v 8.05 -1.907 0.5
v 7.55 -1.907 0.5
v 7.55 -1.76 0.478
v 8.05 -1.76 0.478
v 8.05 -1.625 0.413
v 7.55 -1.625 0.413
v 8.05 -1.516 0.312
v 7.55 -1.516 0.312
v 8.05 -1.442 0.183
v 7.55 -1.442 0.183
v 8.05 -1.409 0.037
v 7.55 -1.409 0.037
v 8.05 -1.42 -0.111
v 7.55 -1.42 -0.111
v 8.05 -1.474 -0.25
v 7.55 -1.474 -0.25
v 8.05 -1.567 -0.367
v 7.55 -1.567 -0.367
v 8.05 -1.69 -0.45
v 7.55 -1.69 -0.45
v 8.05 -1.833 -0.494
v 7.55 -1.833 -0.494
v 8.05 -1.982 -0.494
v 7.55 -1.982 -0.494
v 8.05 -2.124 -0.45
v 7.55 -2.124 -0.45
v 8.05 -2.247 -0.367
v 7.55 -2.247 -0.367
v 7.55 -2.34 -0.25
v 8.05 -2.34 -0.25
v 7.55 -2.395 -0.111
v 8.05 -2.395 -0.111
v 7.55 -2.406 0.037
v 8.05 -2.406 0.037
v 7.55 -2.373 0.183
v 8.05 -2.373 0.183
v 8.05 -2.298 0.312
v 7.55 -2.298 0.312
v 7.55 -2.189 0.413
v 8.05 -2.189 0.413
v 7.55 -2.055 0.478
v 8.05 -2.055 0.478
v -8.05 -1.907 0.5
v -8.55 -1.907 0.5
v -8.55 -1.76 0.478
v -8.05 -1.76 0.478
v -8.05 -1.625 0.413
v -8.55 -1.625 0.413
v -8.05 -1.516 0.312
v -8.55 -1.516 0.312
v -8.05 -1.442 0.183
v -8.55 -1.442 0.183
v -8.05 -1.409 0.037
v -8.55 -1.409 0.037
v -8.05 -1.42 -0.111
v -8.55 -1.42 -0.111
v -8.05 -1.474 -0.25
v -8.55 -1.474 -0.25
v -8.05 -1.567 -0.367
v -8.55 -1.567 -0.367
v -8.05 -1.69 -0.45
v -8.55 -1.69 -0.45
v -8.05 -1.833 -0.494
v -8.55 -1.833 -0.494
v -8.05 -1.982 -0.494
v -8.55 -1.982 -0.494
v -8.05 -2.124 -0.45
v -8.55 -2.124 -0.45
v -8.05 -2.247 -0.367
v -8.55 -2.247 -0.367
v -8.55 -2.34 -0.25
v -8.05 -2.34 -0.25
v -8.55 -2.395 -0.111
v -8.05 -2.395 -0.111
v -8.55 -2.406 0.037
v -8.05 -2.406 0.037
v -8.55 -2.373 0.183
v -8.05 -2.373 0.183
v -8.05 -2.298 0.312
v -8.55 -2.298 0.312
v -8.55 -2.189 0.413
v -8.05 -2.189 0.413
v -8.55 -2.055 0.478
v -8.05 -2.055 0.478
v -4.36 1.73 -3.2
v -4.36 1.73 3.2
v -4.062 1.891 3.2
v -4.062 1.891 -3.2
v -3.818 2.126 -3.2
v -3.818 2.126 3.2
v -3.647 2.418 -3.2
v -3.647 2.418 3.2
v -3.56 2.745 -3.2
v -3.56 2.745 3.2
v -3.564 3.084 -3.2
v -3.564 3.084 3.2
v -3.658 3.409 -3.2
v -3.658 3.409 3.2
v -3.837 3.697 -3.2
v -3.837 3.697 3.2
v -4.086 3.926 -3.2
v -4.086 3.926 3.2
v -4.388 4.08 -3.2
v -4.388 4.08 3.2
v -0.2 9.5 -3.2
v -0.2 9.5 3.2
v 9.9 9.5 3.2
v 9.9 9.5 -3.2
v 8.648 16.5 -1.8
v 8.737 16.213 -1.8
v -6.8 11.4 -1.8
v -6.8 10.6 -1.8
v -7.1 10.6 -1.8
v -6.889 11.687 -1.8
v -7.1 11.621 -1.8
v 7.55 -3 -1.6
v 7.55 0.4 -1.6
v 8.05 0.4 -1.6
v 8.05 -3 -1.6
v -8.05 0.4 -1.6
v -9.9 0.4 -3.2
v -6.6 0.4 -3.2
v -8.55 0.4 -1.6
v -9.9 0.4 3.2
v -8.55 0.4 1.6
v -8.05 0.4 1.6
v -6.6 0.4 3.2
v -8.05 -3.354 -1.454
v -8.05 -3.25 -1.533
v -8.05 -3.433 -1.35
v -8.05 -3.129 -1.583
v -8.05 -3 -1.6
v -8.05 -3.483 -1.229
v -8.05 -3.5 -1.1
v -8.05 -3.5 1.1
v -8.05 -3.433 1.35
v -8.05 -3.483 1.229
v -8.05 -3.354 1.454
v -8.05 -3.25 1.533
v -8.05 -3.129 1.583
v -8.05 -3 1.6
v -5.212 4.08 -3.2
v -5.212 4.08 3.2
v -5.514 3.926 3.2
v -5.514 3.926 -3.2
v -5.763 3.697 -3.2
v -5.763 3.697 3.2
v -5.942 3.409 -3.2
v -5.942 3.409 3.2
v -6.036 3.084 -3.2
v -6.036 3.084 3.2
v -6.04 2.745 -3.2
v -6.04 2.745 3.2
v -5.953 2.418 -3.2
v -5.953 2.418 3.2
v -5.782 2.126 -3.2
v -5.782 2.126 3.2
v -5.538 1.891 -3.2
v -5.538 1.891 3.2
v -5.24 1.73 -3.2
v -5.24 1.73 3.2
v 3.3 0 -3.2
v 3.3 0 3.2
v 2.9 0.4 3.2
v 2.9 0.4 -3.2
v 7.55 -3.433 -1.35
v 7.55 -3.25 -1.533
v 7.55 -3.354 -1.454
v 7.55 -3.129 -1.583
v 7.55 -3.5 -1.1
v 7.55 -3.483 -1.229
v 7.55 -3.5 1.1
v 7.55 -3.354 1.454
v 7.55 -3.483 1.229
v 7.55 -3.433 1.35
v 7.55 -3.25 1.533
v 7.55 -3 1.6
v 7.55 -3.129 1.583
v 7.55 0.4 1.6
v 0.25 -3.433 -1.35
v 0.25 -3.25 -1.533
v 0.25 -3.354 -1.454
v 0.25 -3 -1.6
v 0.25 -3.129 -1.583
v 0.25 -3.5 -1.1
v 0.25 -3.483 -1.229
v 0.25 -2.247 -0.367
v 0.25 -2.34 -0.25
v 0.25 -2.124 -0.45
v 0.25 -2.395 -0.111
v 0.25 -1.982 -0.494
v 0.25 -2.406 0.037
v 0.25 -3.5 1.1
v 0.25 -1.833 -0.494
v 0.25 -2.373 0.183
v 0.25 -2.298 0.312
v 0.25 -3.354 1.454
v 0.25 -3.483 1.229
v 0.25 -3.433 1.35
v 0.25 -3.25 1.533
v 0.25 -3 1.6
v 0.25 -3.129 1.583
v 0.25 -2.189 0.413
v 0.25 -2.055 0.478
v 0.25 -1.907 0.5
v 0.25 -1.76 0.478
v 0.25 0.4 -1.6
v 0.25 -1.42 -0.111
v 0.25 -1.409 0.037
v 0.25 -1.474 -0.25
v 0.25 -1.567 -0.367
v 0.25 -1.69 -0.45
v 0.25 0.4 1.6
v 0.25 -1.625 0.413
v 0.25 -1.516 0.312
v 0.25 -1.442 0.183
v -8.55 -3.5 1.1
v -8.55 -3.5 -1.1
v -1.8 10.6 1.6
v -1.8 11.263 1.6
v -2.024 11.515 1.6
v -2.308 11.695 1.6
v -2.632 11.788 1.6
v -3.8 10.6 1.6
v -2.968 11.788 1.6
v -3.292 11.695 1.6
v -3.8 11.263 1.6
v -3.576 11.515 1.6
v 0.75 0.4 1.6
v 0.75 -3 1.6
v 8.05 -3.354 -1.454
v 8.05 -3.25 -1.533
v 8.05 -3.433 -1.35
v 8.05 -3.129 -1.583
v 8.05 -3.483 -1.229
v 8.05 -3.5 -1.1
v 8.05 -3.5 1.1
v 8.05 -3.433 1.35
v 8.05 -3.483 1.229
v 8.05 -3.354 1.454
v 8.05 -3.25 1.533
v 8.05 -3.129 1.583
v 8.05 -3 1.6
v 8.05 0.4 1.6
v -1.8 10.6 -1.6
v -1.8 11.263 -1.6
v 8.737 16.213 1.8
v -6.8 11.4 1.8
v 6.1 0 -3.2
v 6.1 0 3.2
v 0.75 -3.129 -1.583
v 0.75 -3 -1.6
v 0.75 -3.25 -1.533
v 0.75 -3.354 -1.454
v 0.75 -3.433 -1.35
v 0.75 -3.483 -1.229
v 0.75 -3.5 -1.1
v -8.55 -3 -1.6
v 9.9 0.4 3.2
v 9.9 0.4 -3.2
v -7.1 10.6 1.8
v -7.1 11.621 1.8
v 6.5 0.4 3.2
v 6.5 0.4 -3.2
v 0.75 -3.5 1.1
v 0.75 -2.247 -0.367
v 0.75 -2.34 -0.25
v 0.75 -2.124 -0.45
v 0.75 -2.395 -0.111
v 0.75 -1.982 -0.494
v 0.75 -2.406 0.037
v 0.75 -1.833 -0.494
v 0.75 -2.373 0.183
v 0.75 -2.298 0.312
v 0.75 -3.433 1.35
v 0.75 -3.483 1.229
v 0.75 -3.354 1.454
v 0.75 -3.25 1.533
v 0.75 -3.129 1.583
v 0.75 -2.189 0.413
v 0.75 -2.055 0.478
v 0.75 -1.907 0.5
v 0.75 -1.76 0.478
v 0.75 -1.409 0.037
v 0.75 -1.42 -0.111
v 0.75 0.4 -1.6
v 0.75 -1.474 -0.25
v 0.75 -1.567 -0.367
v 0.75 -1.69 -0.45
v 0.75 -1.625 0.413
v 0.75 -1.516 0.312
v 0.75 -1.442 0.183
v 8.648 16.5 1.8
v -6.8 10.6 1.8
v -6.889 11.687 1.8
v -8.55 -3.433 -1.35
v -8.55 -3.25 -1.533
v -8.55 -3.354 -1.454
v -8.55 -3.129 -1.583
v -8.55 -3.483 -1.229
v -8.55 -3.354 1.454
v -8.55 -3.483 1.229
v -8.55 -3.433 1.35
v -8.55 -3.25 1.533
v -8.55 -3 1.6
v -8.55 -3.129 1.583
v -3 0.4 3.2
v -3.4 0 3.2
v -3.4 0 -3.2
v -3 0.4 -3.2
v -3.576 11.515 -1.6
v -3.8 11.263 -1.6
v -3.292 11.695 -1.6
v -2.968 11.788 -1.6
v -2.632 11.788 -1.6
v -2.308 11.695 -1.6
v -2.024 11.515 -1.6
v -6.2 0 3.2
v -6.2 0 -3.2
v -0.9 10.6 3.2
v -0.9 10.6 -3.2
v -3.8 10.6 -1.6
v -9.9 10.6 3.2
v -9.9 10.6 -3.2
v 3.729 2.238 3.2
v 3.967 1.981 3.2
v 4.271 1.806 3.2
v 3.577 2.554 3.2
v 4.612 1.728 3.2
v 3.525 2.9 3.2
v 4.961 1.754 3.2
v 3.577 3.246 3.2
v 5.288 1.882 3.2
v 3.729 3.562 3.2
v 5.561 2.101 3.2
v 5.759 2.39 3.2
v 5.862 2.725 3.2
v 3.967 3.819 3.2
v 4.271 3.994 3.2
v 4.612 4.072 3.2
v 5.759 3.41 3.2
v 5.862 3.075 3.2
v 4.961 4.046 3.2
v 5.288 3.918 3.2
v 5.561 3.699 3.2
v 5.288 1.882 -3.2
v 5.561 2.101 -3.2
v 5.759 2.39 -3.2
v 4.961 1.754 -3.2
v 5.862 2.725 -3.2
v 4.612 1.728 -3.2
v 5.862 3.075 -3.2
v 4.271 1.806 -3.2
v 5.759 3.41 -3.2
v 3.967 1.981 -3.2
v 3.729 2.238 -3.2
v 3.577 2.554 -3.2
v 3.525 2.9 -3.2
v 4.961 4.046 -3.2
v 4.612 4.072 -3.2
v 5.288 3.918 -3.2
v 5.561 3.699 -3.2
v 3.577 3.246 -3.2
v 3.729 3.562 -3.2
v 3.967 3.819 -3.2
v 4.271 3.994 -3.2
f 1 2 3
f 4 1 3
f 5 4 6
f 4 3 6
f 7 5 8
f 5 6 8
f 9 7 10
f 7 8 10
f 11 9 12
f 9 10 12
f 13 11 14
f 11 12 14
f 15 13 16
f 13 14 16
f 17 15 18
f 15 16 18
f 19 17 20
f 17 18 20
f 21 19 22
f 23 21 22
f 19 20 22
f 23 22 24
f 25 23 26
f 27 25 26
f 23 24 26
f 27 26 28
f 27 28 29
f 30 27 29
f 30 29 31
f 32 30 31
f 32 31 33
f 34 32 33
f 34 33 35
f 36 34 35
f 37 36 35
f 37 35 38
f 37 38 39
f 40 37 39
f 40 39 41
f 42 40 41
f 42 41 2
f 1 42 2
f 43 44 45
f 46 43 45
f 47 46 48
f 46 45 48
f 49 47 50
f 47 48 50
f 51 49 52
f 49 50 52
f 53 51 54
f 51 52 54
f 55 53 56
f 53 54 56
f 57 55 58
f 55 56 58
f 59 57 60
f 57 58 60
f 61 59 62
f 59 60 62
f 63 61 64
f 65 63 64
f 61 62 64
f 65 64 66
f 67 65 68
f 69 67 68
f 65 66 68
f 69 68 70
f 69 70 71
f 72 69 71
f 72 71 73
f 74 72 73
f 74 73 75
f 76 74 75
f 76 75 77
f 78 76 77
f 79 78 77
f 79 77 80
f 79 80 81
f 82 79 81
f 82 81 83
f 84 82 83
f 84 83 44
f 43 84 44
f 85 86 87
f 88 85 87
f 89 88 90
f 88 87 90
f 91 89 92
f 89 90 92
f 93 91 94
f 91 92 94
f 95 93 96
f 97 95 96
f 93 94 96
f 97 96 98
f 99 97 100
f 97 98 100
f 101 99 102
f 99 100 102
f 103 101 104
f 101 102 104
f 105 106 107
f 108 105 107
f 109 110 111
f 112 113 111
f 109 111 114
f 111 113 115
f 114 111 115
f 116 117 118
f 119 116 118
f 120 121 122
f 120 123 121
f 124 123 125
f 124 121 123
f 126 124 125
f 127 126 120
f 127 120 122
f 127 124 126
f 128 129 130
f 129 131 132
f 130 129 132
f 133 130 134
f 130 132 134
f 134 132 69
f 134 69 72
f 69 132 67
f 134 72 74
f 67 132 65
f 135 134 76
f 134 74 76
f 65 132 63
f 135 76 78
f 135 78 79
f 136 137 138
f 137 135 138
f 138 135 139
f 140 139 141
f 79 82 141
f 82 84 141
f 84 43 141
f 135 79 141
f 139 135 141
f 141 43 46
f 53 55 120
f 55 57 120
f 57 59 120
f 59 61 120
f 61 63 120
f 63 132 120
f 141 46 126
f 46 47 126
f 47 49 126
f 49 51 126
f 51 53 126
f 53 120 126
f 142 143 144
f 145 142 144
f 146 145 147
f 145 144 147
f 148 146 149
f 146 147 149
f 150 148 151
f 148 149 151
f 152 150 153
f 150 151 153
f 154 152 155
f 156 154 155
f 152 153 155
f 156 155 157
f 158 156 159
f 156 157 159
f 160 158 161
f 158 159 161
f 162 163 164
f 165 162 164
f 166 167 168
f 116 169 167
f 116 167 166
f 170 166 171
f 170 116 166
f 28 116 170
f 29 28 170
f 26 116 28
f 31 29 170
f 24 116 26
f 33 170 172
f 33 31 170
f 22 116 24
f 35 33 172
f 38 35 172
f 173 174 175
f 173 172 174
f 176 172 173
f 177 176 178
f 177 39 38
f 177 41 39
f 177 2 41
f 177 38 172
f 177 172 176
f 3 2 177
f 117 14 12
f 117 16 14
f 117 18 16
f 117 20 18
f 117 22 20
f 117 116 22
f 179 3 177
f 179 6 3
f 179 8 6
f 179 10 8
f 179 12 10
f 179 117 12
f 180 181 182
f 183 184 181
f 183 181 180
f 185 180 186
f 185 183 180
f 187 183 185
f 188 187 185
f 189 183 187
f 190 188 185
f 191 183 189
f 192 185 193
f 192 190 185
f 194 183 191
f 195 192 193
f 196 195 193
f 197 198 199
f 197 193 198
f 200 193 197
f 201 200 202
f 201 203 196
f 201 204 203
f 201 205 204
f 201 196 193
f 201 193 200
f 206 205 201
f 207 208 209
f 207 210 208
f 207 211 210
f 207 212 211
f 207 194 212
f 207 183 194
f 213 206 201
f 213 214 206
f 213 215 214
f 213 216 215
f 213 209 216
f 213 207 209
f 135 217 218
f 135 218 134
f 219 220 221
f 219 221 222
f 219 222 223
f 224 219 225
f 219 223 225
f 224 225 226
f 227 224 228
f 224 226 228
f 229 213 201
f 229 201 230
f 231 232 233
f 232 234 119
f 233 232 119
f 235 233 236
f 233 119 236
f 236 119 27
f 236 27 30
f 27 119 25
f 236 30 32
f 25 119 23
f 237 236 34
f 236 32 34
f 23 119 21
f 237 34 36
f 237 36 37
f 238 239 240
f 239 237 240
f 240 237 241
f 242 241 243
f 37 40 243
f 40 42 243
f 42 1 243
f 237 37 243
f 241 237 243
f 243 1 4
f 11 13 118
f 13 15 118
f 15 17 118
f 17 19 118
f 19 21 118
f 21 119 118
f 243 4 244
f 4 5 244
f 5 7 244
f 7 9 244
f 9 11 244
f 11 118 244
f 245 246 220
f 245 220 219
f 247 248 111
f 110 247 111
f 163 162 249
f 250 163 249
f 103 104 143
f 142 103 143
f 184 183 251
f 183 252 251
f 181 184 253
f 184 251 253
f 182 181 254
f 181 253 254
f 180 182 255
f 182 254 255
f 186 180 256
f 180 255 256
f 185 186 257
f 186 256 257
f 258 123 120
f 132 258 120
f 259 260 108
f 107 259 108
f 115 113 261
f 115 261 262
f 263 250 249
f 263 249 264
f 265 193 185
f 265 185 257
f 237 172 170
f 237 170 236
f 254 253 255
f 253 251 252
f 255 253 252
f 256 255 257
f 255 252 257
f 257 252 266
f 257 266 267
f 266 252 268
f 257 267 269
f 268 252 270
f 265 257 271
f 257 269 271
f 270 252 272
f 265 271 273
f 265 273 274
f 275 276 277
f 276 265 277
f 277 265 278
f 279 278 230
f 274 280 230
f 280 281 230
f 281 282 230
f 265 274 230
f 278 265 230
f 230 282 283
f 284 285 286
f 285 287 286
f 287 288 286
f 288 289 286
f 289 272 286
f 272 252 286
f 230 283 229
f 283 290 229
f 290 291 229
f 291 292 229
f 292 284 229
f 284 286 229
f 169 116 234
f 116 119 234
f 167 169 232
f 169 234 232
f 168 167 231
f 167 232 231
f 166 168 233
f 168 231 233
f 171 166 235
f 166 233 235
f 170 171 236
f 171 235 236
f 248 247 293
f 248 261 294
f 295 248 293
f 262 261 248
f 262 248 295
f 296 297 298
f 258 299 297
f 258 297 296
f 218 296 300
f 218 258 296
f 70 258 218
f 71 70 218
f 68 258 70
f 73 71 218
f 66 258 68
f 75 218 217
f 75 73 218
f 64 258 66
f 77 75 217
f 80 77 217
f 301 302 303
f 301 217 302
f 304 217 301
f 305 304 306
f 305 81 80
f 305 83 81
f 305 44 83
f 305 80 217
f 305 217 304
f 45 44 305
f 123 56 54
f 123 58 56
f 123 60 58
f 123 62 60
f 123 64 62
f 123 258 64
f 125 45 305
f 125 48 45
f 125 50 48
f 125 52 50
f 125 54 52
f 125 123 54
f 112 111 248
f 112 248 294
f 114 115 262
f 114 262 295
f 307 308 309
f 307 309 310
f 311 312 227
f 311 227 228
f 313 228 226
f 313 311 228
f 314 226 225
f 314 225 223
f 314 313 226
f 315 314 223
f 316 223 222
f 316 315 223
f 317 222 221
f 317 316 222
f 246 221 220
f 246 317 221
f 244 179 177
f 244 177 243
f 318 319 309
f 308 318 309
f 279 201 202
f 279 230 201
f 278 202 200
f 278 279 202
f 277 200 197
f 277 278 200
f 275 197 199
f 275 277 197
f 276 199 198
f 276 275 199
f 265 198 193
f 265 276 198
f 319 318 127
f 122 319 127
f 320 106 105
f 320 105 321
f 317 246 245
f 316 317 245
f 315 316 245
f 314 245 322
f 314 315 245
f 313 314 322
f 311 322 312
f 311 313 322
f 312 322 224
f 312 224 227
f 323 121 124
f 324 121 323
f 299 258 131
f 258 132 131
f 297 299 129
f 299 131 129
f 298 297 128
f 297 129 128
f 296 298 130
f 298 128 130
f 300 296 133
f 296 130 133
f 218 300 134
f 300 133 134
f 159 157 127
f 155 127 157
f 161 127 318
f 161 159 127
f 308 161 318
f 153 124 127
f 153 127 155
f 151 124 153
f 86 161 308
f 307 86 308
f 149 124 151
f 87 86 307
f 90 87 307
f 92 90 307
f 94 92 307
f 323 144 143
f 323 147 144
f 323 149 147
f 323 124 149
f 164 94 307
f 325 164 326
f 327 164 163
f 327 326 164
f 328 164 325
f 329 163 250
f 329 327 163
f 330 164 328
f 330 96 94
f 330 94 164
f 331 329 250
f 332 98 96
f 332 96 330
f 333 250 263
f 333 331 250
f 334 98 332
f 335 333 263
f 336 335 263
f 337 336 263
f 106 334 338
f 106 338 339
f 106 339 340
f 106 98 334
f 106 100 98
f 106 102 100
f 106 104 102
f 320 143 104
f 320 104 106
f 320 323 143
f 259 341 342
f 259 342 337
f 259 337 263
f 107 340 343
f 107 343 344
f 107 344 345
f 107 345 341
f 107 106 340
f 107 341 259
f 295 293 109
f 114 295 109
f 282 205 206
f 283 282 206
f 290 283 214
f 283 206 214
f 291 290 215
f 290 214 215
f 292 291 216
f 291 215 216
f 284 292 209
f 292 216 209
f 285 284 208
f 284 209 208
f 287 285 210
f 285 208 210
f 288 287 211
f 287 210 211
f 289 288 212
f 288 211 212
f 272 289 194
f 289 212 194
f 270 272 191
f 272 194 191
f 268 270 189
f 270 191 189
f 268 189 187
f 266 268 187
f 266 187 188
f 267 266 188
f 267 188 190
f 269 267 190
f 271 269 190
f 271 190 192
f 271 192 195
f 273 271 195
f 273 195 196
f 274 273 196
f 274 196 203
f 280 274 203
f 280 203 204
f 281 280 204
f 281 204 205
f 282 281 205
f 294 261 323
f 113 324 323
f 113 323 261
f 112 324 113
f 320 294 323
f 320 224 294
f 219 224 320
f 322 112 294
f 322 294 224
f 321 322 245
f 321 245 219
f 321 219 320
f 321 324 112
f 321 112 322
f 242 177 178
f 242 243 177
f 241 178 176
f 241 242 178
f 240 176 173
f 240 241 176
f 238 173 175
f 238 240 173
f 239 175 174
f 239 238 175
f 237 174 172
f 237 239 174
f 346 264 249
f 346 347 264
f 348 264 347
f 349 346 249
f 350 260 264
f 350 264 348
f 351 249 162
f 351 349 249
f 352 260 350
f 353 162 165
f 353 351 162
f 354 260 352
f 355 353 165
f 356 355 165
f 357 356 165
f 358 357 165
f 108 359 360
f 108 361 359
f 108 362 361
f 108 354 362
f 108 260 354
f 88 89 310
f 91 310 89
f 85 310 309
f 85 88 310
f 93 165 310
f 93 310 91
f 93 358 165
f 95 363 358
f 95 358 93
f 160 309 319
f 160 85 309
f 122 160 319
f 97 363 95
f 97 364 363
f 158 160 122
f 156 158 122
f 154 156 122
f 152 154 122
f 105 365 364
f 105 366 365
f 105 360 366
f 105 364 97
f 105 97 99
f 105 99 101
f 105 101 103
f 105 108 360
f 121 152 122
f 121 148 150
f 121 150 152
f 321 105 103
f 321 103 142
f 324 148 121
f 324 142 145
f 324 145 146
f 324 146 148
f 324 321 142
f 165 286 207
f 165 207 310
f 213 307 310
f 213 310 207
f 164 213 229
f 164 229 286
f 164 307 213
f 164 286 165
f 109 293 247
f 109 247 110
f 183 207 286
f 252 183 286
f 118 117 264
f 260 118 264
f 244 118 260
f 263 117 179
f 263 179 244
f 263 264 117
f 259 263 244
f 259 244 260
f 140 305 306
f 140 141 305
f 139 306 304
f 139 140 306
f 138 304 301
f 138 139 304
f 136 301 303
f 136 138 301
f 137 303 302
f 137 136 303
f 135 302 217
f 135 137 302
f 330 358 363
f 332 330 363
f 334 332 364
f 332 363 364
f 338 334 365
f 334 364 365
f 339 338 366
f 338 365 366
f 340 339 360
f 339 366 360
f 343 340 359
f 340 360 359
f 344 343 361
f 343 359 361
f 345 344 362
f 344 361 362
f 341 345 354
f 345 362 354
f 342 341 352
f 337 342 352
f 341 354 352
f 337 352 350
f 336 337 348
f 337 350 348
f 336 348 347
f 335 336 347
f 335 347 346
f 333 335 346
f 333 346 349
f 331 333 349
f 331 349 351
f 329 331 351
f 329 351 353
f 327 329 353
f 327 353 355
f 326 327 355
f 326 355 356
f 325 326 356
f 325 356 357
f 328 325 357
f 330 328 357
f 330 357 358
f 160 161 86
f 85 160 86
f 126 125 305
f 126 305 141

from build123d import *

# Parameters (mm, degrees)
BOSS_EXTRU_1_DEPTH                    = 3.6
ESQUISSE2_W                           = 19.8
ESQUISSE2_H                           = 10.6
BOSS_EXTRU_2_DEPTH                    = 1.4
ESQUISSE3_W                           = 19.8
ESQUISSE3_H                           = 10.6
BOSS_EXTRU_3_DEPTH                    = 1.4
ESQUISSE4_W                           = 3.6
ESQUISSE4_H                           = 0.3
BOSS_EXTRU_4_DEPTH                    = 16.265607889
ESQUISSE5_W                           = 10.8
ESQUISSE5_H                           = 1.1
ENL_V_MAT_EXTRU_1_DEPTH               = 7.4
ESQUISSE6_W                           = 3.8
ESQUISSE6_H                           = 0.4
ENL_V_MAT_EXTRU_2_DEPTH               = 7.4
ESQUISSE7_W                           = 6.7
ESQUISSE7_H                           = 0.4
ENL_V_MAT_EXTRU_3_DEPTH               = 7.4
ESQUISSE8_W                           = 3.7
ESQUISSE8_H                           = 0.4
ENL_V_MAT_EXTRU_4_DEPTH               = 7.4
ENL_V_MAT_EXTRU_5_DEPTH               = 7.4
BOSS_EXTRU_5_DEPTH                    = 3.2
ESQUISSE11_W                          = 0.5
ESQUISSE11_H                          = 3.2
BOSS_EXTRU_6_DEPTH                    = 3.9
ESQUISSE12_W                          = 0.5
ESQUISSE12_H                          = 3.2
BOSS_EXTRU_7_DEPTH                    = 3.9
ESQUISSE13_W                          = 0.5
ESQUISSE13_H                          = 3.2
BOSS_EXTRU_8_DEPTH                    = 3.9
D_POUILLE1_ANGLE                      = 32.471192291
D_POUILLE2_ANGLE                      = 45
D_POUILLE3_ANGLE                      = 45
DIAM_TRE_DU_PER_AGE_2_35_2_35_1_D     = 2.35
DIAM_TRE_DU_PER_AGE_2_35_2_35_1_DEPTH = 6.4
CONG_1_R                              = 0.5
ESQUISSE16_R                          = 0.5
ENL_V_MAT_EXTRU_6_DEPTH               = 19.45


with BuildPart() as part:
    # Esquisse1 → Boss.-Extru.1 (new body)
    with BuildSketch(Plane(origin=(0, 0, -1.8), x_dir=(-1, 0, 0), z_dir=(0, 0, -1))):
        Polygon((7.1, 11.621125946), (6.88877818, 11.686563143), (6.8, 11.4), (6.8, 10.6), (-9.9, 10.6), (-9.9, 0), (9.9, 0), (9.9, 10.6), (7.1, 10.6), align=None)
    extrude(amount=-BOSS_EXTRU_1_DEPTH)

    # Esquisse2 → Boss.-Extru.2 (add)
    with BuildSketch(Plane(origin=(0, 0, -1.8), x_dir=(-1, 0, 0), z_dir=(0, 0, -1))):
        with Locations((0, 5.3)):
            Rectangle(ESQUISSE2_W, ESQUISSE2_H)
    extrude(amount=BOSS_EXTRU_2_DEPTH)

    # Esquisse3 → Boss.-Extru.3 (add)
    with BuildSketch(Plane.XY.offset(1.8)):
        with Locations((0, 5.3)):
            Rectangle(ESQUISSE3_W, ESQUISSE3_H)
    extrude(amount=BOSS_EXTRU_3_DEPTH)

    # Esquisse4 → Boss.-Extru.4 (add)
    with BuildSketch(Plane(origin=(-2.982033775, -0.923843615, 0), x_dir=(0, 0, -1), z_dir=(0.955210476, 0.295927265, 0))):
        with Locations((0, 13.051704831)):
            Rectangle(ESQUISSE4_W, ESQUISSE4_H)
    extrude(amount=BOSS_EXTRU_4_DEPTH)

    # Esquisse5 → Enlèv. mat.-Extru.1 (cut, through all)
    with BuildSketch(Plane.XY.offset(3.2)):
        with Locations((4.5, 10.05)):
            Rectangle(ESQUISSE5_W, ESQUISSE5_H)
    extrude(amount=-ENL_V_MAT_EXTRU_1_DEPTH, mode=Mode.SUBTRACT)

    # Esquisse6 → Enlèv. mat.-Extru.2 (cut, through all)
    with BuildSketch(Plane.XY.offset(3.2)):
        with Locations((8, 0.2)):
            Rectangle(ESQUISSE6_W, ESQUISSE6_H)
    extrude(amount=-ENL_V_MAT_EXTRU_2_DEPTH, mode=Mode.SUBTRACT)

    # Esquisse7 → Enlèv. mat.-Extru.3 (cut, through all)
    with BuildSketch(Plane.XY.offset(3.2)):
        with Locations((-0.05, 0.2)):
            Rectangle(ESQUISSE7_W, ESQUISSE7_H)
    extrude(amount=-ENL_V_MAT_EXTRU_3_DEPTH, mode=Mode.SUBTRACT)

    # Esquisse8 → Enlèv. mat.-Extru.4 (cut, through all)
    with BuildSketch(Plane.XY.offset(3.2)):
        with Locations((-8.05, 0.2)):
            Rectangle(ESQUISSE8_W, ESQUISSE8_H)
    extrude(amount=-ENL_V_MAT_EXTRU_4_DEPTH, mode=Mode.SUBTRACT)

    # Esquisse9 → Enlèv. mat.-Extru.5 (cut, through all)
    with BuildSketch(Plane.XY.offset(3.2)):
        with BuildLine():
            Line((-5.24, 1.73), (-4.36, 1.73))
            ThreePointArc((-4.36, 1.73), (-3.550086003, 2.914662921), (-4.387568187, 4.08))
            Line((-4.387568187, 4.08), (-5.212431813, 4.08))
            ThreePointArc((-5.212431813, 4.08), (-6.049913997, 2.914662921), (-5.24, 1.73))
        make_face()
    extrude(amount=-ENL_V_MAT_EXTRU_5_DEPTH, mode=Mode.SUBTRACT)

    # Esquisse10 → Boss.-Extru.5 (add)
    with BuildSketch(Plane(origin=(0, 0, -1.6), x_dir=(-1, 0, 0), z_dir=(0, 0, -1))):
        with BuildLine():
            Line((1.8, 10.6), (3.8, 10.6))
            Line((3.8, 10.6), (3.8, 11.263324958))
            ThreePointArc((3.8, 11.263324958), (2.8, 11.8), (1.8, 11.263324958))
            Line((1.8, 11.263324958), (1.8, 10.6))
        make_face()
    extrude(amount=-BOSS_EXTRU_5_DEPTH)

    # Esquisse11 → Boss.-Extru.6 (add)
    with BuildSketch(Plane.XZ.offset(-0.4)):
        with Locations((-8.3, 0)):
            Rectangle(ESQUISSE11_W, ESQUISSE11_H)
    extrude(amount=BOSS_EXTRU_6_DEPTH)

    # Esquisse12 → Boss.-Extru.7 (add)
    with BuildSketch(Plane.XZ.offset(-0.4)):
        with Locations((0.5, 0)):
            Rectangle(ESQUISSE12_W, ESQUISSE12_H)
    extrude(amount=BOSS_EXTRU_7_DEPTH)

    # Esquisse13 → Boss.-Extru.8 (add)
    with BuildSketch(Plane.XZ.offset(-0.4)):
        with Locations((7.8, 0)):
            Rectangle(ESQUISSE13_W, ESQUISSE13_H)
    extrude(amount=BOSS_EXTRU_8_DEPTH)

    # Dépouille1
    d_pouille1_faces = [part.faces().sort_by_distance(p)[0] for p in [
        (-0.9, 10.05, 0),
    ]]
    draft(d_pouille1_faces, Plane(origin=(-9.9, 10.6, 1.8), x_dir=(0, 0, 1), z_dir=(0, 1, 0)), D_POUILLE1_ANGLE)

    # Dépouille2
    d_pouille2_faces = [part.faces().sort_by_distance(p)[0] for p in [
        (6.1, 0.2, 0),
        (3.3, 0.2, 0),
    ]]
    draft(d_pouille2_faces, Plane(origin=(9.9, 0, 1.8), x_dir=(0, 0, -1), z_dir=(0, -1, 0)), D_POUILLE2_ANGLE)

    # Dépouille3
    d_pouille3_faces = [part.faces().sort_by_distance(p)[0] for p in [
        (-3.4, 0.2, 0),
        (-6.2, 0.2, 0),
    ]]
    draft(d_pouille3_faces, Plane(origin=(9.9, 0, 1.8), x_dir=(0, 0, -1), z_dir=(0, -1, 0)), D_POUILLE3_ANGLE)

    # Diamètre du perçage Ø2.35 (2.35)1
    with Locations(Plane.XY.offset(3.2)):
        with Locations((4.7, 2.9)):
            Hole(DIAM_TRE_DU_PER_AGE_2_35_2_35_1_D / 2, depth=DIAM_TRE_DU_PER_AGE_2_35_2_35_1_DEPTH)

    # Congé1
    cong_1_edges = [part.edges().sort_by_distance(p)[0] for p in [
        (-8.3, -3.5, -1.6),
        (-8.3, -3.5, 1.6),
        (0.5, -3.5, -1.6),
        (0.5, -3.5, 1.6),
        (7.8, -3.5, -1.6),
        (7.8, -3.5, 1.6),
    ]]
    fillet(cong_1_edges, radius=CONG_1_R)

    # Esquisse16 → Enlèv. mat.-Extru.6 (cut, through all)
    with BuildSketch(Plane.ZY.offset(8.55)):
        with Locations((0, -1.907139158)):
            Circle(ESQUISSE16_R)
    extrude(amount=-ENL_V_MAT_EXTRU_6_DEPTH, mode=Mode.SUBTRACT)


solid = part.part
